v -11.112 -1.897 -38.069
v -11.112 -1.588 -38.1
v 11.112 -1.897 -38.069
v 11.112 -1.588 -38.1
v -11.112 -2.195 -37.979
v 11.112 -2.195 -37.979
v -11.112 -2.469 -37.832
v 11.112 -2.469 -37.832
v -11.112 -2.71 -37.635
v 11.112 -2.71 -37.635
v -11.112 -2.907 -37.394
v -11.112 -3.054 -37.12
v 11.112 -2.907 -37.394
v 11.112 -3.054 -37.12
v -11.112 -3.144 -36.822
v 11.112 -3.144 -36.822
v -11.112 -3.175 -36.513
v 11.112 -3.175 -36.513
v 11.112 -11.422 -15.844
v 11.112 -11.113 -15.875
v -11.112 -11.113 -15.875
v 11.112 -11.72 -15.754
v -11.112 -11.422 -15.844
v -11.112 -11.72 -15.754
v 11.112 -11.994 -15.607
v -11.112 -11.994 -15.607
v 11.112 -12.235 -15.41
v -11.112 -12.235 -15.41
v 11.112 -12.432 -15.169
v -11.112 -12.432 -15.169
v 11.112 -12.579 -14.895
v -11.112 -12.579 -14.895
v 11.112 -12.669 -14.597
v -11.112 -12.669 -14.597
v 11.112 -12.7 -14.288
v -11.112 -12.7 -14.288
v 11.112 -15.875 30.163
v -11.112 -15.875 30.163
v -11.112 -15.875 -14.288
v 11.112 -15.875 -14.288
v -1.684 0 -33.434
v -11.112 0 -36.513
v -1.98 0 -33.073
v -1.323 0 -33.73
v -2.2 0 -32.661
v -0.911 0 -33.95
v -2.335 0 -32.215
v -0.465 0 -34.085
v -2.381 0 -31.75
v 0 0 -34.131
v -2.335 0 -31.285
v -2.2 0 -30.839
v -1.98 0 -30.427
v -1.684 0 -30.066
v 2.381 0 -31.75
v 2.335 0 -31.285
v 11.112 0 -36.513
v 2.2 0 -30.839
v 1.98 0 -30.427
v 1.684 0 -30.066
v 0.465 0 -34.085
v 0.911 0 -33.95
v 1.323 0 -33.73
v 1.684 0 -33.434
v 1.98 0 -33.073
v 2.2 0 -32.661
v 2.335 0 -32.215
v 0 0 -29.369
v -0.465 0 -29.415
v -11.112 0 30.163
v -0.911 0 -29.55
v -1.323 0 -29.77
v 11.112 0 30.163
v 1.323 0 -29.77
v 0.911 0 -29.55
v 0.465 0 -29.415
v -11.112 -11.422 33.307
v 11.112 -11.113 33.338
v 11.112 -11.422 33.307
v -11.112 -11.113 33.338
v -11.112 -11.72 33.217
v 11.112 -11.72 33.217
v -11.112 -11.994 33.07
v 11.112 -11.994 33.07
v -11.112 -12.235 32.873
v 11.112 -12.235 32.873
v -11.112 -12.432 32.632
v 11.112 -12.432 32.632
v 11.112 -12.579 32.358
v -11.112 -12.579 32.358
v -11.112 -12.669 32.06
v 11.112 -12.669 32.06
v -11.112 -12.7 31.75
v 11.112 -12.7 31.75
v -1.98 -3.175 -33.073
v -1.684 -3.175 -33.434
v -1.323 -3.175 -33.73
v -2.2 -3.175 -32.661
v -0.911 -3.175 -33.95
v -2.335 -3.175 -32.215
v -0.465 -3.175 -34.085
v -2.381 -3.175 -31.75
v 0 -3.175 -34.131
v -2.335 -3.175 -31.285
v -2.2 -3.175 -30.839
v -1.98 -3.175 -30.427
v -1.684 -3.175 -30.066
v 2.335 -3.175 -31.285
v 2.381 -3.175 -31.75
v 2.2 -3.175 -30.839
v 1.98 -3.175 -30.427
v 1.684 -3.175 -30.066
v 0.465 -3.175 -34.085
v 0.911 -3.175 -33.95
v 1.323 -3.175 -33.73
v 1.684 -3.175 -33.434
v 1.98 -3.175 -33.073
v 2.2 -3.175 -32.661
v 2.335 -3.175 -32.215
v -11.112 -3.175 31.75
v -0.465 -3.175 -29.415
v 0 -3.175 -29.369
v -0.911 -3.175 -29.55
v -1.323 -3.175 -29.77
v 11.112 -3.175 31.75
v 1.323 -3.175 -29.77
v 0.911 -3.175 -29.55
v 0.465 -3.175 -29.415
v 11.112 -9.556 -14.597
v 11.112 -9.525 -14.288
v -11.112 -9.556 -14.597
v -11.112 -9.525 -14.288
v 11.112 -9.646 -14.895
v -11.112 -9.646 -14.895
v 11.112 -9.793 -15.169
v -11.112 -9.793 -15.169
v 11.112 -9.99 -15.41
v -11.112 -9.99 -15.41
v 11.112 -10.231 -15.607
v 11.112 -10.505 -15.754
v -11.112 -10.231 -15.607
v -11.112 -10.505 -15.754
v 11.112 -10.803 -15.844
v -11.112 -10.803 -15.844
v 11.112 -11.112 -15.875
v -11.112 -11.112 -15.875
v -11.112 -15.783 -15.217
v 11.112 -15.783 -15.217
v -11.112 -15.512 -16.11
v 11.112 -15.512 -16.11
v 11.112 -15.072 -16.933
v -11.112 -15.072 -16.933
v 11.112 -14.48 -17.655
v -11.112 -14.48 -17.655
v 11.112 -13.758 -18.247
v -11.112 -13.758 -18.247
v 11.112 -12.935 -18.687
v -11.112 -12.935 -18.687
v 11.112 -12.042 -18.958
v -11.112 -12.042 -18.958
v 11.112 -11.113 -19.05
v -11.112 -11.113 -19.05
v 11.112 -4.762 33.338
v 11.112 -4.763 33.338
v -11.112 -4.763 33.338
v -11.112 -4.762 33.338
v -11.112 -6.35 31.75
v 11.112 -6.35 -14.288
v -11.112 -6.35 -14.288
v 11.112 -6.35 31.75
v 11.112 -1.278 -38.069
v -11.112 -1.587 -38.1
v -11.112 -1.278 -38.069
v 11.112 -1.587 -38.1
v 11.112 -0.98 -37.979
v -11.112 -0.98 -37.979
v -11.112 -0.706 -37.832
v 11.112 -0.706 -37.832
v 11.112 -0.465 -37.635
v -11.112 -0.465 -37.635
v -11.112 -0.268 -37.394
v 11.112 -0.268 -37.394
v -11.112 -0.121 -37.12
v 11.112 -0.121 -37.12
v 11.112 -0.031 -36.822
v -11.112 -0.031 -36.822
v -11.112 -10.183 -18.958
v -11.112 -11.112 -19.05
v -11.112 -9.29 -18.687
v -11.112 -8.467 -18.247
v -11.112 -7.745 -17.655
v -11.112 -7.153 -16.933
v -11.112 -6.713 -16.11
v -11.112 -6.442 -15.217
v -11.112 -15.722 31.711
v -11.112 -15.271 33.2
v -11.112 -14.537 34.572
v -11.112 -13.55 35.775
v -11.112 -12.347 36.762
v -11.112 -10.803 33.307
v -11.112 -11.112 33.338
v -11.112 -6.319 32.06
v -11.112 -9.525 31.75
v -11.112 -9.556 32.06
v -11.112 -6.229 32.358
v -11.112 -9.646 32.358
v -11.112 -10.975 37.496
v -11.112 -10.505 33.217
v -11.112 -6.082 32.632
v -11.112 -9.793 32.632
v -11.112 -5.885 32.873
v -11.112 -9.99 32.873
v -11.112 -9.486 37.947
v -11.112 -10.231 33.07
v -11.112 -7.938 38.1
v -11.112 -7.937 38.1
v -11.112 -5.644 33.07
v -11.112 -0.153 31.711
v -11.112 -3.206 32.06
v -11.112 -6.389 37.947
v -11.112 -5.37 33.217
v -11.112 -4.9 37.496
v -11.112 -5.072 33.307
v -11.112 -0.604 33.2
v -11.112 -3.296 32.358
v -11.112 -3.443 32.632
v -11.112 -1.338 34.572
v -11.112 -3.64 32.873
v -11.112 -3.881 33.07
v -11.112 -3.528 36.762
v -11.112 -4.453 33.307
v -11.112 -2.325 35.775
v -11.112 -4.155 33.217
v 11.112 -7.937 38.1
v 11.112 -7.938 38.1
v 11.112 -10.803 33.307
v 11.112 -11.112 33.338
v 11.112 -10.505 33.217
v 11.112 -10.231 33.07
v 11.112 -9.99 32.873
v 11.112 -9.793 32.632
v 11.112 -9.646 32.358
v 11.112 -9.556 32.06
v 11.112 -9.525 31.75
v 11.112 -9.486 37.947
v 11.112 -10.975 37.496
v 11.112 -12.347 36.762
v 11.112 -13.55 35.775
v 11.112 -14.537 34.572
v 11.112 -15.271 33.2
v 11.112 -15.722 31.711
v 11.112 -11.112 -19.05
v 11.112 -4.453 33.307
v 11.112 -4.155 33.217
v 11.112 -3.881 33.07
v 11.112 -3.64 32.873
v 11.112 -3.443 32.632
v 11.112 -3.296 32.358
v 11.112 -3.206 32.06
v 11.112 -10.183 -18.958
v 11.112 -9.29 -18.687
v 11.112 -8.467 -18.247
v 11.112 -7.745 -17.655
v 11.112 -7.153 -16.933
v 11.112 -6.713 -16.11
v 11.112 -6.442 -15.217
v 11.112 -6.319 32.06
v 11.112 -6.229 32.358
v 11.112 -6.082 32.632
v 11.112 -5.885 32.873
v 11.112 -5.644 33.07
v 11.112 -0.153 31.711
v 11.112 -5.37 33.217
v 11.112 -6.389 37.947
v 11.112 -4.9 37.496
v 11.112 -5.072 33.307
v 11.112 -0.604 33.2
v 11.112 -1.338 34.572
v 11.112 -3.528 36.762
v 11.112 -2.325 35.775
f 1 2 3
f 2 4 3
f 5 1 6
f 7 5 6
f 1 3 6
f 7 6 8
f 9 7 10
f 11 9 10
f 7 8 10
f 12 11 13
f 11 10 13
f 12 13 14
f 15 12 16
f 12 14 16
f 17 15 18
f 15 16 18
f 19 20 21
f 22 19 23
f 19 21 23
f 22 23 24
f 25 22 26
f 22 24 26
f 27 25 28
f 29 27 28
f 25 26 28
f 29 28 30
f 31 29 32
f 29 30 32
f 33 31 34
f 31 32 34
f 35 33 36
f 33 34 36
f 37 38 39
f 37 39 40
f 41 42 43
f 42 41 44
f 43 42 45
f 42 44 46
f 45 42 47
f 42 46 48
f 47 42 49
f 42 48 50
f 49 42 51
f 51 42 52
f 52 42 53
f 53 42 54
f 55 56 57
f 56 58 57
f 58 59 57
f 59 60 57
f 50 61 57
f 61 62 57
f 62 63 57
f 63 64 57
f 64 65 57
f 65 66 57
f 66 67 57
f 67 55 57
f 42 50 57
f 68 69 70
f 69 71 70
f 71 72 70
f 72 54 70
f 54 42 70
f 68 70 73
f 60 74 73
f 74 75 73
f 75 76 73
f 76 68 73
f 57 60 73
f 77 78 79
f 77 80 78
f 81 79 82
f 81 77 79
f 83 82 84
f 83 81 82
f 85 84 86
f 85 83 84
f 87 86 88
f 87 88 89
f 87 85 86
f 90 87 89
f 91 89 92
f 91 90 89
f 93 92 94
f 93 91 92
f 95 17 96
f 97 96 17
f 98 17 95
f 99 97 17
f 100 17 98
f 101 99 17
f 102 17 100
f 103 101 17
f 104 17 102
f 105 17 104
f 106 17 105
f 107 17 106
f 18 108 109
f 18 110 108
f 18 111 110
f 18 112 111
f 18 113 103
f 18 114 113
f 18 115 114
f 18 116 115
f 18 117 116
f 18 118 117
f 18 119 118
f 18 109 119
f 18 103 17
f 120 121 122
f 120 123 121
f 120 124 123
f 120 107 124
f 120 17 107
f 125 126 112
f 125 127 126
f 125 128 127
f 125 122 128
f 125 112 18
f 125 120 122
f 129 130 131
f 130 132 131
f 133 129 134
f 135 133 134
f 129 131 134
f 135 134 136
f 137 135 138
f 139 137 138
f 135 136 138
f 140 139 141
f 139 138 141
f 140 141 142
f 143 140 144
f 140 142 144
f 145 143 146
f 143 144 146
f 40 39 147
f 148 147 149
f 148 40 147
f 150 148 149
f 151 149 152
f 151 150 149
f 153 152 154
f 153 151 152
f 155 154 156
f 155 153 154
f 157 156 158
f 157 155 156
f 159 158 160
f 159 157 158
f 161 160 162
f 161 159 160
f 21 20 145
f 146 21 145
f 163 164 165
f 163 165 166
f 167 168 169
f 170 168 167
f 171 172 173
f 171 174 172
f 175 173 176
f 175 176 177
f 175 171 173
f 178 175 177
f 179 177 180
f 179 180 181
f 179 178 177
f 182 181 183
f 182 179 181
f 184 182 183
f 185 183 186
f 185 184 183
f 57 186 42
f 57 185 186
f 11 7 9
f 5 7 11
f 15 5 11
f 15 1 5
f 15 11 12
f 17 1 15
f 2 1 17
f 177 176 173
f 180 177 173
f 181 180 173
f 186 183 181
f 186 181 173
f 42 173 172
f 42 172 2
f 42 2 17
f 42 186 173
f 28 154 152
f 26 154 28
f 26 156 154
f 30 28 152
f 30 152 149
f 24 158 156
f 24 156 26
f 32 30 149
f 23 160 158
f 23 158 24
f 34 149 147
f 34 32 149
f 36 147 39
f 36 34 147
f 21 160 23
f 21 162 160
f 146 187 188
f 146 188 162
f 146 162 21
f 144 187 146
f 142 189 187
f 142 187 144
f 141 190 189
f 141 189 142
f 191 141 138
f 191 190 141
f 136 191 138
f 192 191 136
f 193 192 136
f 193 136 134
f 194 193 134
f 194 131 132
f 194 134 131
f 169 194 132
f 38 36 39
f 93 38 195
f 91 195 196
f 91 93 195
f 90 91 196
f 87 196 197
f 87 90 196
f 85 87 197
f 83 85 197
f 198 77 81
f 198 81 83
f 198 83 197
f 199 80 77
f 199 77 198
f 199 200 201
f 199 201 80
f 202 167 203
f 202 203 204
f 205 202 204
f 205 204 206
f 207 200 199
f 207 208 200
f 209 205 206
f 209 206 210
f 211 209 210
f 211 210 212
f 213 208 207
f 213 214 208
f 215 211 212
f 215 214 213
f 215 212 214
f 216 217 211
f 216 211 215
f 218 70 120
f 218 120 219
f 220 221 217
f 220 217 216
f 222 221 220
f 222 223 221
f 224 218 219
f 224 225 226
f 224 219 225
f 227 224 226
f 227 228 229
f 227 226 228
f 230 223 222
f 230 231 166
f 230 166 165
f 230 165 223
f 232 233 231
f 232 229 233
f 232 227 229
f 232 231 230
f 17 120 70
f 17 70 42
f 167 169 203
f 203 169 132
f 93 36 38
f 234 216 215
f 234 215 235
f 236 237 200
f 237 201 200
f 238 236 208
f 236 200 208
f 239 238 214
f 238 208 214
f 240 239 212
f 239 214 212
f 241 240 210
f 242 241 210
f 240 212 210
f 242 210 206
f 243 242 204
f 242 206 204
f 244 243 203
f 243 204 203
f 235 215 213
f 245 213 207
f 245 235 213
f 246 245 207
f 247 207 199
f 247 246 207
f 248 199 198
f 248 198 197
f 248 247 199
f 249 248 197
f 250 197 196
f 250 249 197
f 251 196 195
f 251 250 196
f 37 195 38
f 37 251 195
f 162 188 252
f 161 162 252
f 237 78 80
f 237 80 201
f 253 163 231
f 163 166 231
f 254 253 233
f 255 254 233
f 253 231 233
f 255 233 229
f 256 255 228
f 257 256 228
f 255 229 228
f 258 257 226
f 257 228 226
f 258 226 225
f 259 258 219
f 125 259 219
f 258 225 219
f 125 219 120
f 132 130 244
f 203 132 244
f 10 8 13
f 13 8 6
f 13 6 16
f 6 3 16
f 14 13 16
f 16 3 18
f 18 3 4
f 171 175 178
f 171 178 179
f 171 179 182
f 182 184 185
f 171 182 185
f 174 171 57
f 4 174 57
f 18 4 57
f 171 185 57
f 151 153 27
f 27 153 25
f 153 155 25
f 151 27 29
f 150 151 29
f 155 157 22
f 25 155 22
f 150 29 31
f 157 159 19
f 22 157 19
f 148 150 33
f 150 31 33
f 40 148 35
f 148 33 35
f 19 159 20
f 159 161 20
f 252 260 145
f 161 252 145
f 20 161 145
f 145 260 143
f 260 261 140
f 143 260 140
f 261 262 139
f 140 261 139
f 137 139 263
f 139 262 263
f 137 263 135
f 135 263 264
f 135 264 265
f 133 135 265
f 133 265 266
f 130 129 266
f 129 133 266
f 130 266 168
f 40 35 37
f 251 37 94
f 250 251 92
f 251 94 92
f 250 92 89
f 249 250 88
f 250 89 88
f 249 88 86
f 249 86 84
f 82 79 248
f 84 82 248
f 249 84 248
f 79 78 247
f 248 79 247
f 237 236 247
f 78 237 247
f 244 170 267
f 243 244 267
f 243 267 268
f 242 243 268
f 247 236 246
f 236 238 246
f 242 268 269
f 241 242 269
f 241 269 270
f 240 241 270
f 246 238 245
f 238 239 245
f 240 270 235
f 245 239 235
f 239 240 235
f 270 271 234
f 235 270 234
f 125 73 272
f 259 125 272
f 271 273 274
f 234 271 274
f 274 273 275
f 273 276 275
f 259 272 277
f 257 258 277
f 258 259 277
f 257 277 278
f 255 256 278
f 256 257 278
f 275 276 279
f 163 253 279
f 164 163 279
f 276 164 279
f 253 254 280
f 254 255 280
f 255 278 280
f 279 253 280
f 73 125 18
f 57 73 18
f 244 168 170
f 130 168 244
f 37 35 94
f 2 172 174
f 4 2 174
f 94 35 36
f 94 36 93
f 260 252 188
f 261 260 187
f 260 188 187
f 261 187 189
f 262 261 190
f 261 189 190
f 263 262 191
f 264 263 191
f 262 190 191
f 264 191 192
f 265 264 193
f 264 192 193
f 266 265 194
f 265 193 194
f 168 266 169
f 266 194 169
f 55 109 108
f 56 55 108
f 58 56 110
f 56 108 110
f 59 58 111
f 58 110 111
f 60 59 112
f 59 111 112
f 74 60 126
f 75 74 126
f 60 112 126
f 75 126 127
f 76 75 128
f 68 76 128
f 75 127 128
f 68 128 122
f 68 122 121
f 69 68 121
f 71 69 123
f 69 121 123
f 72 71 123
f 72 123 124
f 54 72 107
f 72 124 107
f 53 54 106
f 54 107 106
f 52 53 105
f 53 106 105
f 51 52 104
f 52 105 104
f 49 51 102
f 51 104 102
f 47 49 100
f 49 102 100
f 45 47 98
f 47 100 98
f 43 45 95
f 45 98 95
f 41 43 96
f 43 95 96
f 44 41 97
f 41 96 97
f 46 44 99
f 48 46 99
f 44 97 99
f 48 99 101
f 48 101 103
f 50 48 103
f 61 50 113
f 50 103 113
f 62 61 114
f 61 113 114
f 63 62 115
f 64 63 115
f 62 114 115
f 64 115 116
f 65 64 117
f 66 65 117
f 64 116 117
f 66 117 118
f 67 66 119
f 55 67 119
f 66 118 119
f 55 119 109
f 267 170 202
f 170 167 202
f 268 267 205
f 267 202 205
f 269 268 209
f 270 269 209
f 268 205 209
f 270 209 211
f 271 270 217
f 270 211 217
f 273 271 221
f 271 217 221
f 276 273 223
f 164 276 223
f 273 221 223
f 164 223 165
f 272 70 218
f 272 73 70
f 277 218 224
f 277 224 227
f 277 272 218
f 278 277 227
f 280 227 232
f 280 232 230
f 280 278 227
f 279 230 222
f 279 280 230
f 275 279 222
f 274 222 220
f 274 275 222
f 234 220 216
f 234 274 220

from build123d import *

# Parameters (mm, degrees)
F8_W      = 22.225
F8_H      = 76.2
F9_DEPTH  = 3.175
F0_W      = 22.225
F0_H      = 57.15
F10_DEPTH = 12.7
F1_R      = 2.38125
F2_DEPTH  = 3.175
F3_W      = 3.175
F3_H      = 49.2125
F3_H_2    = 52.3875
F4_DEPTH  = 22.225
F5_R      = 1.58749
F6_R      = 7.93749
F7_R      = 4.76249


# Not quite as in the source:
# - a fillet or chamfer is up to 0.001 mm smaller than in the source, because OpenCascade refuses the exact size


with BuildPart() as f9:
    # F8 (on Front) → F9 (new body)
    with BuildSketch(Plane.XZ):
        Rectangle(F8_W, F8_H)
    extrude(amount=F9_DEPTH)

    # F0 (on face) → F10 (join)
    with BuildSketch(Plane.XZ.offset(3.175)):
        with Locations((0, 9.525)):
            Rectangle(F0_W, F0_H)
    extrude(amount=F10_DEPTH)

    # F1 (on face) → F2 (cut, through all)
    with BuildSketch(Plane.XZ.offset(3.175)):
        with Locations((0, -31.75)):
            Circle(F1_R)
    extrude(amount=-F2_DEPTH, mode=Mode.SUBTRACT)

    # F3 (on face) → F4 (cut, through all)
    with BuildSketch(Plane.YZ.offset(11.1125)):
        with Locations((-11.1125, 8.73125)):
            Rectangle(F3_W, F3_H)
        with Locations((-4.7625, 7.14375)):
            Rectangle(F3_W, F3_H_2)
    extrude(amount=-F4_DEPTH, mode=Mode.SUBTRACT)

    # F5 (radius 1.5875 in the source; OpenCascade refuses exactly that, so slightly less here)
    f5_edges = [f9.edges().sort_by_distance(p)[0] for p in [
        (0, -12.7, 33.3375),
        (0, -6.35, 33.3375),
        (0, -9.525, 33.3375),
        (0, -3.175, 33.3375),
        (0, -12.7, -15.875),
        (0, -9.525, -15.875),
        (0, 0, -38.1),
        (0, -3.175, -38.1),
    ]]
    fillet(f5_edges, radius=F5_R)

    # F6 (radius 7.9375 in the source; OpenCascade refuses exactly that, so slightly less here)
    f6_edges = [f9.edges().sort_by_distance(p)[0] for p in [
        (0, -15.875, 38.1),
        (0, 0, 38.1),
    ]]
    fillet(f6_edges, radius=F6_R)

    # F7 (radius 4.7625 in the source; OpenCascade refuses exactly that, so slightly less here)
    f7_edges = [f9.edges().sort_by_distance(p)[0] for p in [
        (0, -15.875, -19.05),
        (0, -6.35, -19.05),
    ]]
    fillet(f7_edges, radius=F7_R)


solid = f9.part
